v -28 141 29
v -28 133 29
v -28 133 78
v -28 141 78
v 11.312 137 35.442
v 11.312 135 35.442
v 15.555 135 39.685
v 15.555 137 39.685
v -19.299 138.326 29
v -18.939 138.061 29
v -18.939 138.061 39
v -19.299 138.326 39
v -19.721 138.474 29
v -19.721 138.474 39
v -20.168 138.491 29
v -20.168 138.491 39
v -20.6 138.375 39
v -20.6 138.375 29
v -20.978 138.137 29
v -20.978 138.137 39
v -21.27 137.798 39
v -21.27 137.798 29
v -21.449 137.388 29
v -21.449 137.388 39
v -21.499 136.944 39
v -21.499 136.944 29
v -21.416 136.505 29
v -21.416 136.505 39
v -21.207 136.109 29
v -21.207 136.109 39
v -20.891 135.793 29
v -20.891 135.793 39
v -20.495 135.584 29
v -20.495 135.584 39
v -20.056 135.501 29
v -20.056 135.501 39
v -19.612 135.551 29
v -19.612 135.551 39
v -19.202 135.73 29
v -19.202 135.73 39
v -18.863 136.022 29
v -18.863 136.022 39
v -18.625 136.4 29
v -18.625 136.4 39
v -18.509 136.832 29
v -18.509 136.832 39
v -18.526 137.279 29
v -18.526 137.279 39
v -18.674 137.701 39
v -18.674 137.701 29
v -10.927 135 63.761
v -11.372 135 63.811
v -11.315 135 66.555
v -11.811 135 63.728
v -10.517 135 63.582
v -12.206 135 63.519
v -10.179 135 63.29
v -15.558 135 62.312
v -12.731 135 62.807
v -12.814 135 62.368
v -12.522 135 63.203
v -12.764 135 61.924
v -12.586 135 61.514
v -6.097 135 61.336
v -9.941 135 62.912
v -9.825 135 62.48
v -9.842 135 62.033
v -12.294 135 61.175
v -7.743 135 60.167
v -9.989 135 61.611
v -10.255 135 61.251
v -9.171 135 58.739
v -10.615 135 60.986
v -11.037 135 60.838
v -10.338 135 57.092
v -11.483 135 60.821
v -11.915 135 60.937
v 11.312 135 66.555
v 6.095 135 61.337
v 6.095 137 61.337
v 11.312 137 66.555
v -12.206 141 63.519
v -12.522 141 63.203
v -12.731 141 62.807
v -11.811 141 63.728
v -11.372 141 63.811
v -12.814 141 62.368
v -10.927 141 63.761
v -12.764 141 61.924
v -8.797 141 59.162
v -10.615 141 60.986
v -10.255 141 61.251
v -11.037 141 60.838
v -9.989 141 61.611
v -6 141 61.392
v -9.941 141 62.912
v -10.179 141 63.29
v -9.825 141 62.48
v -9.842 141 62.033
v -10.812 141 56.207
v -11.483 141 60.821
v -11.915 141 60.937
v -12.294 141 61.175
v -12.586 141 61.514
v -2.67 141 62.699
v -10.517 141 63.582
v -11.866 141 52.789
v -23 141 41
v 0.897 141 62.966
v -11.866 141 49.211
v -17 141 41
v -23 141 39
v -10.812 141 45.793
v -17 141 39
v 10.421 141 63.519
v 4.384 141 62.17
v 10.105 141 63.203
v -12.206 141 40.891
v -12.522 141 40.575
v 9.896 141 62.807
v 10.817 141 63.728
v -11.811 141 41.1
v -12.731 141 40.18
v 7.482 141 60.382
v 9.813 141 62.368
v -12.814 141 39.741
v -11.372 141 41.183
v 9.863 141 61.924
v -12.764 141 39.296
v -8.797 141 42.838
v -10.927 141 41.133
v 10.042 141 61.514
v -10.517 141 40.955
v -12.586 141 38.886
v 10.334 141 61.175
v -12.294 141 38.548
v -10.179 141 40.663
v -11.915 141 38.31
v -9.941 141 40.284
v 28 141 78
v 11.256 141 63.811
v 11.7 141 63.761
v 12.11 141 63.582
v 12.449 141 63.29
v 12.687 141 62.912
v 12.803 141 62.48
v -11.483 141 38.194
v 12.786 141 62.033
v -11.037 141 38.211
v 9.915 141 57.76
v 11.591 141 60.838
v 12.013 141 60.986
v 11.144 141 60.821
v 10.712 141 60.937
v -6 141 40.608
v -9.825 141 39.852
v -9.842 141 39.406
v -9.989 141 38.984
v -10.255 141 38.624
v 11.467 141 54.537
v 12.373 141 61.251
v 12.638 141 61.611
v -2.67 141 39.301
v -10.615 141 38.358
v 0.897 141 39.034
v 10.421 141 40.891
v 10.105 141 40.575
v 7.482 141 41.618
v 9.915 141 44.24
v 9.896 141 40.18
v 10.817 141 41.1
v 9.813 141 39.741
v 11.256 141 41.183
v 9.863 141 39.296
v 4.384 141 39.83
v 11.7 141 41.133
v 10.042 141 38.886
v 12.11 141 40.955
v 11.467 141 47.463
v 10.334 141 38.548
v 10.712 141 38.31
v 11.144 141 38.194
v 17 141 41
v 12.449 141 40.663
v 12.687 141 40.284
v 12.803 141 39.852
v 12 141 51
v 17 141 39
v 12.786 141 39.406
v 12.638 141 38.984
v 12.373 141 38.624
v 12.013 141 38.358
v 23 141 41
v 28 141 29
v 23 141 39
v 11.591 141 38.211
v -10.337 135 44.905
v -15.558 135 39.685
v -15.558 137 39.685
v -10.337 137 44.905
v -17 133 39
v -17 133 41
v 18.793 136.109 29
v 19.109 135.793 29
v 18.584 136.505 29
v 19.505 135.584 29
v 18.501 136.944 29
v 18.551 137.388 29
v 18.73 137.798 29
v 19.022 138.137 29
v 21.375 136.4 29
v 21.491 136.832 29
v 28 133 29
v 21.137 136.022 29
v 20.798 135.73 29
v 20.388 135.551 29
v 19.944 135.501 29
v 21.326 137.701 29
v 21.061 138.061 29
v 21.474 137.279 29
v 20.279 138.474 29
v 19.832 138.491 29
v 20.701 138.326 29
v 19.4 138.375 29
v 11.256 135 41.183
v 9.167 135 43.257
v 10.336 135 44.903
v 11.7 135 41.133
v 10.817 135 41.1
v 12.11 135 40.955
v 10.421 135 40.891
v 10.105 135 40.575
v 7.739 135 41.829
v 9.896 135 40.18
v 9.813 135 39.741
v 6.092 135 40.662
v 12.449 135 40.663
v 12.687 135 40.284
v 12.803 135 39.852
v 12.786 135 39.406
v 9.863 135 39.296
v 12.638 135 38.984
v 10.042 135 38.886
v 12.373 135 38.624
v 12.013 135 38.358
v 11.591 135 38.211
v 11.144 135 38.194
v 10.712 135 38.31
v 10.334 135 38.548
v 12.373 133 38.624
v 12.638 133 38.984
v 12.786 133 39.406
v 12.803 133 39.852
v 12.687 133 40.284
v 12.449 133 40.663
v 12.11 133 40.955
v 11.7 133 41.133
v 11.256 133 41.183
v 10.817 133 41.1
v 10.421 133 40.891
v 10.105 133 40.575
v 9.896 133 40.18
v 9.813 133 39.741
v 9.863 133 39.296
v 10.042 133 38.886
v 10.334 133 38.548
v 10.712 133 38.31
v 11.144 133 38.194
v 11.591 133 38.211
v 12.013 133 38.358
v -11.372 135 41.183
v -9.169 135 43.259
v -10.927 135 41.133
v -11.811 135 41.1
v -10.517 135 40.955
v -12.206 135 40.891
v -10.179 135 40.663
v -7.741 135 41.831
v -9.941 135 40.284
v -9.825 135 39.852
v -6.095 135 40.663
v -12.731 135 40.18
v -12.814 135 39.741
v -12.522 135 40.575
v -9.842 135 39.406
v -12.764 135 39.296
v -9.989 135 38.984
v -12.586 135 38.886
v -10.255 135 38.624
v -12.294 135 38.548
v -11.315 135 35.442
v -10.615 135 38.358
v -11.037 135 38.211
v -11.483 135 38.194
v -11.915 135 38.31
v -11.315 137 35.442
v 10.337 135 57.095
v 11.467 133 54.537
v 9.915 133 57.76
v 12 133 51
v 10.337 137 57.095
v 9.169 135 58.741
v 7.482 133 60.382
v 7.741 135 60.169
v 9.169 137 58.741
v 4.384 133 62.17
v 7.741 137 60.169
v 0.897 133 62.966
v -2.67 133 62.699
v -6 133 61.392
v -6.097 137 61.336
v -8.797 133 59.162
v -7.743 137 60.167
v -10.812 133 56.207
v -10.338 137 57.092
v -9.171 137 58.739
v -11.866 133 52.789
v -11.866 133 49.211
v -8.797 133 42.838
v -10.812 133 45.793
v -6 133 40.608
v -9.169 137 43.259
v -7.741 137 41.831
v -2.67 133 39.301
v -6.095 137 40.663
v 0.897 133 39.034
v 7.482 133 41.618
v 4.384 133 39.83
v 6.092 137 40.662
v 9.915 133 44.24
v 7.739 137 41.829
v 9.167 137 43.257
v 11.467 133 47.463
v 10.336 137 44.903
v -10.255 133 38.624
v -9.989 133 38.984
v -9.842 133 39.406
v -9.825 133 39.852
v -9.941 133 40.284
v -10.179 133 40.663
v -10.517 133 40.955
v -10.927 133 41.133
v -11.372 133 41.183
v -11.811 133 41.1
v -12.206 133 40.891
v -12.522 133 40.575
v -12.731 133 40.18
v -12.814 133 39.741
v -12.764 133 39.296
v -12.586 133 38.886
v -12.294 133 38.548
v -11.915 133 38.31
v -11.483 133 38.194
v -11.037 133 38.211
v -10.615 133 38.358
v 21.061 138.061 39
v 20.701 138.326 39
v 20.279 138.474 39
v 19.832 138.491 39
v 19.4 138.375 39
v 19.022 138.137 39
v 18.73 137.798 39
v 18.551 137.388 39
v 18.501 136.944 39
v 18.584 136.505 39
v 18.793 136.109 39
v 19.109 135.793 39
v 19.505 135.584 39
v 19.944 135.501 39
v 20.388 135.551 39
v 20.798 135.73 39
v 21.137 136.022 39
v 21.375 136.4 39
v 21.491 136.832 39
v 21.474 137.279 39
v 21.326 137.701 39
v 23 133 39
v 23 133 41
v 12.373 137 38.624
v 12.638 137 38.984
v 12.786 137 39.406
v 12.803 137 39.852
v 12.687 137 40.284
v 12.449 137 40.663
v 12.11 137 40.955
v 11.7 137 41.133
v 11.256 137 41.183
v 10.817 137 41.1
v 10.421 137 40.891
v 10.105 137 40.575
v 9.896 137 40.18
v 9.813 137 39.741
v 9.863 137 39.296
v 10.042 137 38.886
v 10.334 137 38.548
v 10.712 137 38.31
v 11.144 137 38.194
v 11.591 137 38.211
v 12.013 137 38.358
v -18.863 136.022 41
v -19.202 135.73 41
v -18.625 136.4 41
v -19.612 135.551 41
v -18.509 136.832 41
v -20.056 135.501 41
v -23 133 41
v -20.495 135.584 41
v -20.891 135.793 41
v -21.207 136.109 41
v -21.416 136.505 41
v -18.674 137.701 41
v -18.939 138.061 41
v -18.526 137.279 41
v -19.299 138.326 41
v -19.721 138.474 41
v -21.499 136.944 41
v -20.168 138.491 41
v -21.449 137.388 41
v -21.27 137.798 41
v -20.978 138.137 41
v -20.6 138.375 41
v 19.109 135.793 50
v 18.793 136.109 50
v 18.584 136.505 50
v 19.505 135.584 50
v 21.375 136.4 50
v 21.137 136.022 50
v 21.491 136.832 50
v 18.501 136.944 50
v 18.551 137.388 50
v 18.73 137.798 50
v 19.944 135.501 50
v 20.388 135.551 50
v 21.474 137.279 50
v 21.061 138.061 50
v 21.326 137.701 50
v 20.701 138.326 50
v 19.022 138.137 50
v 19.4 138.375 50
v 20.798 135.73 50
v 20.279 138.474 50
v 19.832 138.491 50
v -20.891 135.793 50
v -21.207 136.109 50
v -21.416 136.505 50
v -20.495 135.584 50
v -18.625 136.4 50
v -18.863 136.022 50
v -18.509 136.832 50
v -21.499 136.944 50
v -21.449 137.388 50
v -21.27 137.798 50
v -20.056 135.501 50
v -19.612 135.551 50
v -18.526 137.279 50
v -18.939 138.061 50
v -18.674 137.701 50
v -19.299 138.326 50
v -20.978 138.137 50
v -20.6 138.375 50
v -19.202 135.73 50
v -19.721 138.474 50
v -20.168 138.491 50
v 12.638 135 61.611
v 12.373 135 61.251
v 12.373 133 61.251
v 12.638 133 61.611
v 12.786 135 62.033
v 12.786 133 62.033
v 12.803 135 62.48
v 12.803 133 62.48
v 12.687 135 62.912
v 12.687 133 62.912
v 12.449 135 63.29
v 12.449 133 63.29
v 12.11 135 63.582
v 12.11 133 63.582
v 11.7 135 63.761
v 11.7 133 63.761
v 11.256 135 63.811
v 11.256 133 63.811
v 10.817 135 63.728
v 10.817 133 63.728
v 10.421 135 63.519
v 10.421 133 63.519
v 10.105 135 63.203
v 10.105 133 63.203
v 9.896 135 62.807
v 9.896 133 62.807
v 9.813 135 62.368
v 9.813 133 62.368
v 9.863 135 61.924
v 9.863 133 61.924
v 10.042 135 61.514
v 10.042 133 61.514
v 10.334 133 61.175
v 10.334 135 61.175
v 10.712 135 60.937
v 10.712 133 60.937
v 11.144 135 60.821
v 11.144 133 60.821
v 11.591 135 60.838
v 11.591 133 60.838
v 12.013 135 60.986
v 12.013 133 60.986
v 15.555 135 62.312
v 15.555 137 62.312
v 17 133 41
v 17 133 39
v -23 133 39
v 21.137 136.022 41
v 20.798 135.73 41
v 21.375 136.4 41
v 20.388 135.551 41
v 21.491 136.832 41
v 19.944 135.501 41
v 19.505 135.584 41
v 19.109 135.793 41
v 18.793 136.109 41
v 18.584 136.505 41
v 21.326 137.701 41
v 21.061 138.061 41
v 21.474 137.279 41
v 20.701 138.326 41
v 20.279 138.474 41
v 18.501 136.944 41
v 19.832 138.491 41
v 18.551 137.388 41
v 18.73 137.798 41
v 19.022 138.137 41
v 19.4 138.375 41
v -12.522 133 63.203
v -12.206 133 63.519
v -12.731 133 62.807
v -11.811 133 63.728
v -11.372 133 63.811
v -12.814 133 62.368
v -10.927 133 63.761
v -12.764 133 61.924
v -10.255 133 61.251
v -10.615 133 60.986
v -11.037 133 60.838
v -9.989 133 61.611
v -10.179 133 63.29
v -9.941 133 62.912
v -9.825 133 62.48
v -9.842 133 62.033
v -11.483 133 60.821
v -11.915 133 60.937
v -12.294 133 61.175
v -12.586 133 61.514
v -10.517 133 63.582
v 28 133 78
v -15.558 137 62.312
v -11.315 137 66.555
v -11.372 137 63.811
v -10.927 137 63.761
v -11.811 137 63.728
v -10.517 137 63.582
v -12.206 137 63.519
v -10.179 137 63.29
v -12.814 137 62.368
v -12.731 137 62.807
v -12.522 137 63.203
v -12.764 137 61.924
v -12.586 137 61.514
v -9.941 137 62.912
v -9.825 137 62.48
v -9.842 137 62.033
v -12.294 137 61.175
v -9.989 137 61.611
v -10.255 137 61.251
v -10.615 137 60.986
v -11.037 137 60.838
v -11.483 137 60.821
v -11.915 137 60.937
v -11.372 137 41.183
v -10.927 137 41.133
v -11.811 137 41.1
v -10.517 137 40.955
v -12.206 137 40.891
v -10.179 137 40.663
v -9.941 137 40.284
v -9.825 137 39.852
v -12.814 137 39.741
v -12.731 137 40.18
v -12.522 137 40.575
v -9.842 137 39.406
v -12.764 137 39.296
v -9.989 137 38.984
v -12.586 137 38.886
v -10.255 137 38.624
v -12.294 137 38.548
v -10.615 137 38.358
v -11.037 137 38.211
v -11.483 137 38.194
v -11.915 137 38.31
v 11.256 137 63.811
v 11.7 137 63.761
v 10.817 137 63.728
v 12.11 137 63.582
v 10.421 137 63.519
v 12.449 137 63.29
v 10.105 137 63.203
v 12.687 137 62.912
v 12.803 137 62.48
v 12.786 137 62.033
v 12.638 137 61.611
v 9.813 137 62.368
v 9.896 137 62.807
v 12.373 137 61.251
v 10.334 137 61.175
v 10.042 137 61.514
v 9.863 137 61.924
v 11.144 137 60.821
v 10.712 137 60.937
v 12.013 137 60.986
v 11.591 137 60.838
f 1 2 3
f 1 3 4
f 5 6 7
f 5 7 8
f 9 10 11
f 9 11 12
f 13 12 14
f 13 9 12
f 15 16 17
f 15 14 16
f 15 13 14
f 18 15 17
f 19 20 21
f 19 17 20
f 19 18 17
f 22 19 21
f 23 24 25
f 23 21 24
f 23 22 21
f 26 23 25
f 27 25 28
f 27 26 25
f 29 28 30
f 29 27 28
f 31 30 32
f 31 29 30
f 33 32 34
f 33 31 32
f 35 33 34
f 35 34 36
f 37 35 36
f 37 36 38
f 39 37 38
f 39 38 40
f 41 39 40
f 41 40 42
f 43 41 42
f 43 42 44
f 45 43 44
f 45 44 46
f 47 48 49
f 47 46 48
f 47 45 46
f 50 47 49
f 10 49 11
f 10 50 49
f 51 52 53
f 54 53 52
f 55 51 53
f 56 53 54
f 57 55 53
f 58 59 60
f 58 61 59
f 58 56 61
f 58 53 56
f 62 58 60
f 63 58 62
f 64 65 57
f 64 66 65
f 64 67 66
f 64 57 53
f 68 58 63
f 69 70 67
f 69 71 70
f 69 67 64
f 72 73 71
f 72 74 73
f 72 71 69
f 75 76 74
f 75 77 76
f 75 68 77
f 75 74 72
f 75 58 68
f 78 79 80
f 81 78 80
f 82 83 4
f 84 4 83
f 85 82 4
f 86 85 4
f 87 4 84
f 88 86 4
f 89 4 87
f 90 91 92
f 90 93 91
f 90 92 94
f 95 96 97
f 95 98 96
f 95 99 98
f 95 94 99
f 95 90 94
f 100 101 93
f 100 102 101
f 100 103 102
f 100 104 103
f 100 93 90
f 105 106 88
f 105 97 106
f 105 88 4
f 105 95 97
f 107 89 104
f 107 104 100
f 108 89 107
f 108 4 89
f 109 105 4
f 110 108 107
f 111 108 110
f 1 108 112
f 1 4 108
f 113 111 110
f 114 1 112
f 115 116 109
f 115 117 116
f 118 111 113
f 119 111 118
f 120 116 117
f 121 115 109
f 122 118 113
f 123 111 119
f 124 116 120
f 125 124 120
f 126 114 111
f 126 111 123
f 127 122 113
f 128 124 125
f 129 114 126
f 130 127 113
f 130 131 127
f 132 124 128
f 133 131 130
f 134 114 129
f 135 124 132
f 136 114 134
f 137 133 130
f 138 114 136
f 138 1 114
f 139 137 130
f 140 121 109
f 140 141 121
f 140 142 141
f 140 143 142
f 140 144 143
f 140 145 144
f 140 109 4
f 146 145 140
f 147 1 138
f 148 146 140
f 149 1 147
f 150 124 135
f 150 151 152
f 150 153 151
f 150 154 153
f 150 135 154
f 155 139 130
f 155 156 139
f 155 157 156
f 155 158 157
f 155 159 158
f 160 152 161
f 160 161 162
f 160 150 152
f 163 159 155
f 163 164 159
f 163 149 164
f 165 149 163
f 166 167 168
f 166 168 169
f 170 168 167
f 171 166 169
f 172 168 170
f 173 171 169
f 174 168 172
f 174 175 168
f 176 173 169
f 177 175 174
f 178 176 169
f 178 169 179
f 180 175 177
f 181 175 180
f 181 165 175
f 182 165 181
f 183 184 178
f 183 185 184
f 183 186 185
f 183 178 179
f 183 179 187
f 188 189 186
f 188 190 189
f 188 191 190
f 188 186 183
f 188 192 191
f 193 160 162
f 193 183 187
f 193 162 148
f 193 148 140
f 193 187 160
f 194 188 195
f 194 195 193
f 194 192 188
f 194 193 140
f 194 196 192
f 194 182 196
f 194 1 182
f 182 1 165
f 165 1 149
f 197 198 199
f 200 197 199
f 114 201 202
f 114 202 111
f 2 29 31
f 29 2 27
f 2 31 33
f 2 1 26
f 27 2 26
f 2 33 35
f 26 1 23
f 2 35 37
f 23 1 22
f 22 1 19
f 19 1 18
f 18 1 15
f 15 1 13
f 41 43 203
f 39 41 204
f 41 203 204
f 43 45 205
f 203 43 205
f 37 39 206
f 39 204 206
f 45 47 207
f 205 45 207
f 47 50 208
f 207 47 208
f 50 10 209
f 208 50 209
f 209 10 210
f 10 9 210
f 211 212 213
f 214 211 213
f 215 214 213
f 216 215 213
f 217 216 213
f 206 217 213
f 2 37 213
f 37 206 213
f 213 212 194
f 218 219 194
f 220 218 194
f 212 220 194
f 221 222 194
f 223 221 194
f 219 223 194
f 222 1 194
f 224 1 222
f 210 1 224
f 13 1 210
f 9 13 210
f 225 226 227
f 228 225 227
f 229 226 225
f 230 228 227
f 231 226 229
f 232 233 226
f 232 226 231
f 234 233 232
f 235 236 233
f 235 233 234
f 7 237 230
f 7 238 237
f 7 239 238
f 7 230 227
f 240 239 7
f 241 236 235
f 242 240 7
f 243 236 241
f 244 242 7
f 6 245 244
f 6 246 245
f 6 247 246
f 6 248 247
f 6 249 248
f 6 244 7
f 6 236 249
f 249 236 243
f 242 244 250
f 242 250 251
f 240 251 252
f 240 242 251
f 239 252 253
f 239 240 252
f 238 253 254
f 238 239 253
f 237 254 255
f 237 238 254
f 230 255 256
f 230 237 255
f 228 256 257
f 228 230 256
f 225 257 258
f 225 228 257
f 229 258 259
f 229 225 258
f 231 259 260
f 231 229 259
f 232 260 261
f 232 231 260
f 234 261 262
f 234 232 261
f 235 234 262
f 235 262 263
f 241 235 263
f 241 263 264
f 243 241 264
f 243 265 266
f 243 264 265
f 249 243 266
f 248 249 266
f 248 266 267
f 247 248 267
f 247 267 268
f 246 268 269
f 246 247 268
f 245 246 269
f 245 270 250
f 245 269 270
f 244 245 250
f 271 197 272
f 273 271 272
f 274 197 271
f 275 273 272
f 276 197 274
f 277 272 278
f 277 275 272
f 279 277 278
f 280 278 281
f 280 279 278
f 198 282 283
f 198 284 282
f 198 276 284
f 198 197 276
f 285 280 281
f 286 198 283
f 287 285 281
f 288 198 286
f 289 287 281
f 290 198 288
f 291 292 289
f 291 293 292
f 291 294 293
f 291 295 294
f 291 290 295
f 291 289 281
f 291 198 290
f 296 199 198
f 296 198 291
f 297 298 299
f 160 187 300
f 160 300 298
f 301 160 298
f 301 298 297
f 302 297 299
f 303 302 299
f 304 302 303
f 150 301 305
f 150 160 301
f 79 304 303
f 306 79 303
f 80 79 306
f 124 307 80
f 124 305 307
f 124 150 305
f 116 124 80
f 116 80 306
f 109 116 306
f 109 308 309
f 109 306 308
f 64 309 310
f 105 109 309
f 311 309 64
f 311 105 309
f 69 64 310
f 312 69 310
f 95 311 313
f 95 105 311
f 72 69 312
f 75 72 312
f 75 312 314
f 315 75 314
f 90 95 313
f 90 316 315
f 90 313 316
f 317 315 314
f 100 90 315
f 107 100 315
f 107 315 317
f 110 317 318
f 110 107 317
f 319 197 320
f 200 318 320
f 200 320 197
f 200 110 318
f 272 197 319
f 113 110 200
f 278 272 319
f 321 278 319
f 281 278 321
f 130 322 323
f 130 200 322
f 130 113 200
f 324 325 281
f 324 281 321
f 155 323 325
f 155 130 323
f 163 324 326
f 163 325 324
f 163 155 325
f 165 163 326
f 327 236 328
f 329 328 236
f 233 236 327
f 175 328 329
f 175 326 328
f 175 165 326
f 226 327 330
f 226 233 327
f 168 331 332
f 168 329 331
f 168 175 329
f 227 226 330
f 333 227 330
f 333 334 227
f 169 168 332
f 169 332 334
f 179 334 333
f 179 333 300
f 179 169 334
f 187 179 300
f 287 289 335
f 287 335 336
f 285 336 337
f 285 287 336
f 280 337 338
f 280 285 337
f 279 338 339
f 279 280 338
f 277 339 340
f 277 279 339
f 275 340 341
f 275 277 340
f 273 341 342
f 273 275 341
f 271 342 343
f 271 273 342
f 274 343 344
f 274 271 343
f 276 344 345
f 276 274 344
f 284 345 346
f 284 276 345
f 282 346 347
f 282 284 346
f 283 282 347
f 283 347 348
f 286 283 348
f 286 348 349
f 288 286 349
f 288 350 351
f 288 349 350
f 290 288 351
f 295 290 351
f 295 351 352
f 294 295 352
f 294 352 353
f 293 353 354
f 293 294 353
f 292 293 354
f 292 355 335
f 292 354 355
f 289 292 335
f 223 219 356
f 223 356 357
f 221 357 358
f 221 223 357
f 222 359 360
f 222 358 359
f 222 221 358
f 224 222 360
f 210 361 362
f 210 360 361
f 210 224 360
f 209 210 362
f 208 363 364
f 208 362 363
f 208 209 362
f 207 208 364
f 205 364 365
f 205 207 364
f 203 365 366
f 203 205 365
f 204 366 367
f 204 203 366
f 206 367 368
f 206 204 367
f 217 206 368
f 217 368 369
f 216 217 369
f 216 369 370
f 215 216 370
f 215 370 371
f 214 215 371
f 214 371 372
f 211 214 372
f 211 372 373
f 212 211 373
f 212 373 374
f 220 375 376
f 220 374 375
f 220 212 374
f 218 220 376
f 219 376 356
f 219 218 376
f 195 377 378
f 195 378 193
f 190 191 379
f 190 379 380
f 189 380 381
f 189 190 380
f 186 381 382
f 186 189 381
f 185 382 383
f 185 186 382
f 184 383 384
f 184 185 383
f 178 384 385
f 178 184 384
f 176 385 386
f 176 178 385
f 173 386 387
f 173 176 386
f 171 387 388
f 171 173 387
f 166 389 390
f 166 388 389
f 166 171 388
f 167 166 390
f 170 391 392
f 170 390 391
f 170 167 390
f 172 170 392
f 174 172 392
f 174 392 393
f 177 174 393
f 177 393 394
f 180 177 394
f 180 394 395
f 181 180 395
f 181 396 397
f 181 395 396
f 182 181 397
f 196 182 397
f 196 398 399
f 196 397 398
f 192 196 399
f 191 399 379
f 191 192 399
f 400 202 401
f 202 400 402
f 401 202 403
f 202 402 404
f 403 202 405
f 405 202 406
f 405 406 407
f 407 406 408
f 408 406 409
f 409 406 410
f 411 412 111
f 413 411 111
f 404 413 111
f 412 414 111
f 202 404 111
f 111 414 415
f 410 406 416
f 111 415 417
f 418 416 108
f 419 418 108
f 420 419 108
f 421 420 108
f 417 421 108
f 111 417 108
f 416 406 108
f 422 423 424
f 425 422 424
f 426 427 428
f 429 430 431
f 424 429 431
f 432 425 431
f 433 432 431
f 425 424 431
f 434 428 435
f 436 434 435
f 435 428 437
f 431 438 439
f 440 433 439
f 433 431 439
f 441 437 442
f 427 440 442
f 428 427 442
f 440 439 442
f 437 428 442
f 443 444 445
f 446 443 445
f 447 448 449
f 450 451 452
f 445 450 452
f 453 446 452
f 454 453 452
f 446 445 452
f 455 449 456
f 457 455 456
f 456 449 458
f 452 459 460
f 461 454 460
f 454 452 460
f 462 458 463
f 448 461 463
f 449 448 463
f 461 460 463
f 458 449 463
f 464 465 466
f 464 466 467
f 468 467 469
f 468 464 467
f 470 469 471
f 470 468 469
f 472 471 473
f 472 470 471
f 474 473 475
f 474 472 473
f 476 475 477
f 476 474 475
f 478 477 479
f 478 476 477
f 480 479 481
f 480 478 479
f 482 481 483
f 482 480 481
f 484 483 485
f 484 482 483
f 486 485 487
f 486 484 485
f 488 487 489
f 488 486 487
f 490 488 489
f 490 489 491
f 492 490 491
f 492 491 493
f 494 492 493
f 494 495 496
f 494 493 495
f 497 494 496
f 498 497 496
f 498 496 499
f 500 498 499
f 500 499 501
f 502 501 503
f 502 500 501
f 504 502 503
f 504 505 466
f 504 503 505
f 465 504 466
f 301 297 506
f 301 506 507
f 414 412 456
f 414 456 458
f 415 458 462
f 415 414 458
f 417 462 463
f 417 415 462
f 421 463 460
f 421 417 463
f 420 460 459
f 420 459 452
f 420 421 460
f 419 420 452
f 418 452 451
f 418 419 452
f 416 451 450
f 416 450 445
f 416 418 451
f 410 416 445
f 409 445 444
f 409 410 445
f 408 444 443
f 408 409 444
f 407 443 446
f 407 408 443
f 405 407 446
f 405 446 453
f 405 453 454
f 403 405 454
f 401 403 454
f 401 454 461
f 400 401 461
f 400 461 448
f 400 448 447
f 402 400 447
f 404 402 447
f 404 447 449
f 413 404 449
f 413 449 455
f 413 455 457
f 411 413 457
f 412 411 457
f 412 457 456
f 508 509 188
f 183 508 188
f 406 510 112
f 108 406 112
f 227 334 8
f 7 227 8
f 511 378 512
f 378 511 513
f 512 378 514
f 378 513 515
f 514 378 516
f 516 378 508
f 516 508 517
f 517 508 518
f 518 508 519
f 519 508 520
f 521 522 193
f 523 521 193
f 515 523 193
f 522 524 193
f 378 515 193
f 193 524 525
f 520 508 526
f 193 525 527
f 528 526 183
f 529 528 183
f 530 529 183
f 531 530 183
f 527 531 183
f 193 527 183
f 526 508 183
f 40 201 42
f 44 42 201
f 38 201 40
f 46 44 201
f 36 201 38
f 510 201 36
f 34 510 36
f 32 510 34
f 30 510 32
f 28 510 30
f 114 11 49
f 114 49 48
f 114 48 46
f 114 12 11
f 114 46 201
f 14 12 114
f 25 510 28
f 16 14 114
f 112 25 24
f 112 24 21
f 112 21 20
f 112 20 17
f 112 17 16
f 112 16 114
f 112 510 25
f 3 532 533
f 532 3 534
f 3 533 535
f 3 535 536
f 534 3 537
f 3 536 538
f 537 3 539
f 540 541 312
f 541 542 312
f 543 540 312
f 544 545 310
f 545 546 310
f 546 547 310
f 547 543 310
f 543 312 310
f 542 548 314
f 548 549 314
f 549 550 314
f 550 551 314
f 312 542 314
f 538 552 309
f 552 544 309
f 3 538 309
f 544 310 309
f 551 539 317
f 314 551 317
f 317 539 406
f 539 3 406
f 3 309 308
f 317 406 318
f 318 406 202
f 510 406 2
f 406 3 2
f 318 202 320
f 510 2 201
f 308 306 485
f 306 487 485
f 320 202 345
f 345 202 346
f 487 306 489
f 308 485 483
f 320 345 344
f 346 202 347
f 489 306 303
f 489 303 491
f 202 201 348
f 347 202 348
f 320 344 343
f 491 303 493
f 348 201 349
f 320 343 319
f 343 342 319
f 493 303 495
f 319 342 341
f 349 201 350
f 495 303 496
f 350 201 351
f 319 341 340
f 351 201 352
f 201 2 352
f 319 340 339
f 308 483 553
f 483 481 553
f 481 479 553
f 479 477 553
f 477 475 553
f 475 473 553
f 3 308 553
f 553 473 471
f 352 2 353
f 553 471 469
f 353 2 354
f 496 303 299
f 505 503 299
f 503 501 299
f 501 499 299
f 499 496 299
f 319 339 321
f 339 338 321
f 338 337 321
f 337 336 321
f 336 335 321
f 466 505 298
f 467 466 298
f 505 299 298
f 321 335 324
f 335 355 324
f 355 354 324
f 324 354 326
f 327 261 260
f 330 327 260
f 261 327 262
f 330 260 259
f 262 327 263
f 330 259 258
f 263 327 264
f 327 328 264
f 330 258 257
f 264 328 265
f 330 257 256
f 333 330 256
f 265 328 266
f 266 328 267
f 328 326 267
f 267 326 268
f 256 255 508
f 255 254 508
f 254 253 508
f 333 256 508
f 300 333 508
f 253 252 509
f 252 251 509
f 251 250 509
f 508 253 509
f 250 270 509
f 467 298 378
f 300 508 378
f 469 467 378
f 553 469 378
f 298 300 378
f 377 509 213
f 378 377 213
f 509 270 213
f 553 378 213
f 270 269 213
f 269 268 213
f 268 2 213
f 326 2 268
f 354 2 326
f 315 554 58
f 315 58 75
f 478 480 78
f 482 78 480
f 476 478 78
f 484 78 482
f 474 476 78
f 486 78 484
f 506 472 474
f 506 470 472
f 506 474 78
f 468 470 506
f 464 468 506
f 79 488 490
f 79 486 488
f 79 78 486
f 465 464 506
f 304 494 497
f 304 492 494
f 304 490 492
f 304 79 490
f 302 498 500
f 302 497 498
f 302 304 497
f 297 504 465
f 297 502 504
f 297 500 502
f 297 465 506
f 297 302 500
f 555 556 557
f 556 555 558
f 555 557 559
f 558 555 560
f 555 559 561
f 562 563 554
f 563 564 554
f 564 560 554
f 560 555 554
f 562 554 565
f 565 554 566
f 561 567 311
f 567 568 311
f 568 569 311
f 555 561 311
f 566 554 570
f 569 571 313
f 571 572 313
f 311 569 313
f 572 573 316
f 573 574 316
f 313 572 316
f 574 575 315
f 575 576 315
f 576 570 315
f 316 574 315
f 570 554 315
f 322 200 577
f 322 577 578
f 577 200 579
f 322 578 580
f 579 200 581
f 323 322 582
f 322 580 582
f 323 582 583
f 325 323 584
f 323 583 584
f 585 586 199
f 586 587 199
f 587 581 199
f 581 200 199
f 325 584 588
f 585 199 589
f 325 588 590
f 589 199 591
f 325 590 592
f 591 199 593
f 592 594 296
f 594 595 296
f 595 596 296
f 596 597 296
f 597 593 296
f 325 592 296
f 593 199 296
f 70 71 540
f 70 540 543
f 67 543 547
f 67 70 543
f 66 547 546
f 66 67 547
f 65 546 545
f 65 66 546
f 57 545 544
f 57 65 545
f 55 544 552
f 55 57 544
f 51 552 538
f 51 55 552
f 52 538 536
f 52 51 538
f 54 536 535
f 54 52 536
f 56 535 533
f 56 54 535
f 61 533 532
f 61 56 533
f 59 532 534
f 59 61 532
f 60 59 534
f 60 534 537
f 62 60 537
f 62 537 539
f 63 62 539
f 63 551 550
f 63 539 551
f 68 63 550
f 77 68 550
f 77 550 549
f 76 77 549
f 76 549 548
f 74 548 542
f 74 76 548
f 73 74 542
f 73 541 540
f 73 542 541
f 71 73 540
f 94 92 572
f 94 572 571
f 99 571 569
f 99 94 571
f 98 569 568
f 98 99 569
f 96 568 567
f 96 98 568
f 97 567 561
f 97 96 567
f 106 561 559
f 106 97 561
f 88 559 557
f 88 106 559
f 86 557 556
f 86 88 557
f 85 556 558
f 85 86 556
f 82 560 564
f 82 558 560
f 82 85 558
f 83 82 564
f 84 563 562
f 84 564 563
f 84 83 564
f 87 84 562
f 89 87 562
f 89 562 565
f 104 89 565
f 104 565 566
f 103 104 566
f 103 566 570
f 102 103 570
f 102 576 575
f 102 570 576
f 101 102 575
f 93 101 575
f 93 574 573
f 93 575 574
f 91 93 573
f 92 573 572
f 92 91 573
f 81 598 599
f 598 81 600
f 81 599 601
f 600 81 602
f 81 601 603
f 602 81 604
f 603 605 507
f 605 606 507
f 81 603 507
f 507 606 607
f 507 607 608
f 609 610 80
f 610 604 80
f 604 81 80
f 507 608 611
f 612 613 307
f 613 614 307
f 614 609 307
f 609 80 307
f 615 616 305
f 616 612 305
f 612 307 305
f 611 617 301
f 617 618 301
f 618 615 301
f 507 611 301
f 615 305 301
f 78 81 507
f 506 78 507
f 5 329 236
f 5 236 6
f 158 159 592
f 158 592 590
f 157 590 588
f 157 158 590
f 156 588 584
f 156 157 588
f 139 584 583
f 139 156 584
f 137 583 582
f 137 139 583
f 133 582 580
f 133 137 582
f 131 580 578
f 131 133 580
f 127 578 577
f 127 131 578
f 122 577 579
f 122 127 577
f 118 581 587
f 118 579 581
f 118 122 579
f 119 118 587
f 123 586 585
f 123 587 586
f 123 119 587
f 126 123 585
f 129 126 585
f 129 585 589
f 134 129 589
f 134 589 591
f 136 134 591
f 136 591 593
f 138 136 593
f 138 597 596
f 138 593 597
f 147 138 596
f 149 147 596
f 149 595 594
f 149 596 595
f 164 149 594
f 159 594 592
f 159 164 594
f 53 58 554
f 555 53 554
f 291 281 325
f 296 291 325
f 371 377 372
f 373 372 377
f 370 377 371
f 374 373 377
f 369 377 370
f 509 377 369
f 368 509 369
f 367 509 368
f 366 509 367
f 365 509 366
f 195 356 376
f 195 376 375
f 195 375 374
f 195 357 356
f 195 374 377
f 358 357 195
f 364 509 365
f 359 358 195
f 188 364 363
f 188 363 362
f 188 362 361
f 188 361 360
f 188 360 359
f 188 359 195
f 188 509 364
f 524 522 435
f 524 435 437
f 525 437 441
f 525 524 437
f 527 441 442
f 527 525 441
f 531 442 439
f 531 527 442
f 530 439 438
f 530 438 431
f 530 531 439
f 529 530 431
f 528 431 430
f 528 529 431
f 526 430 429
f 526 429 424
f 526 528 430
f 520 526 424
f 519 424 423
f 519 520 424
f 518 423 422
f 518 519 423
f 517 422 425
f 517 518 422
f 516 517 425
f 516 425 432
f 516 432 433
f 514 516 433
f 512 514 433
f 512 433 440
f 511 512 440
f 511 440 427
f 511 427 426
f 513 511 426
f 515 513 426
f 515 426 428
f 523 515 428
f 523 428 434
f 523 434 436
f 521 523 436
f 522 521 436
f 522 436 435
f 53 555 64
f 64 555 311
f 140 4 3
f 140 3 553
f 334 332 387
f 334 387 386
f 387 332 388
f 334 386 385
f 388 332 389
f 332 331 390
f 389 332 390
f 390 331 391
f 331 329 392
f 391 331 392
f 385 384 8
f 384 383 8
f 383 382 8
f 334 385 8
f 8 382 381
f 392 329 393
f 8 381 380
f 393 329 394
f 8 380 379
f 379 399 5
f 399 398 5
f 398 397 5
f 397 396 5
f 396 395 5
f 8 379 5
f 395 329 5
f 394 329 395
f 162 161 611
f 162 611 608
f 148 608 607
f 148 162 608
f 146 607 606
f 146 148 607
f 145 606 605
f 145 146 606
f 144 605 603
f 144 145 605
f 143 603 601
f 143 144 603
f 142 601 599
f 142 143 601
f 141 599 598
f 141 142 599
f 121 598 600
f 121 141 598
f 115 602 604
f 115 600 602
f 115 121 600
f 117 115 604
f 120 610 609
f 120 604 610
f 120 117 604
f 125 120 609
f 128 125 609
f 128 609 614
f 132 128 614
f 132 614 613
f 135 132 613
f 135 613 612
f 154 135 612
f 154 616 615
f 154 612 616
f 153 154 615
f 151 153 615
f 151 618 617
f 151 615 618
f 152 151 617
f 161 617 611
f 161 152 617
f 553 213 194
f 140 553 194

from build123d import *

# Parameters (mm, degrees)
BOX775_W                     = 8
BOX775_H                     = 6
BOX775_DEPTH                 = 2
BOX776_W                     = 8
BOX776_H                     = 6
BOX776_DEPTH                 = 2
CYLINDER1869_R               = 1.5
CYLINDER1869_DEPTH           = 50
CYLINDER1869_PLACEMENT_ANGLE = 45
CYLINDER1870_R               = 1.5
CYLINDER1870_DEPTH           = 50
CYLINDER1870_PLACEMENT_ANGLE = 45
BOX770_W                     = 6
BOX770_H                     = 2
BOX770_DEPTH                 = 8
BOX766_W                     = 8
BOX766_H                     = 2
BOX766_DEPTH                 = 6
BOX768_W                     = 8
BOX768_H                     = 2
BOX768_DEPTH                 = 6
BOX769_W                     = 6
BOX769_H                     = 2
BOX769_DEPTH                 = 8
COMPOUND924_PLACEMENT_ANGLE  = 45
CYLINDER1846_R               = 12
CYLINDER1846_DEPTH           = 20
CYLINDER1848_R               = 1.5
CYLINDER1848_DEPTH           = 40
CYLINDER1850_R               = 1.5
CYLINDER1850_DEPTH           = 40
CYLINDER1849_R               = 1.5
CYLINDER1849_DEPTH           = 40
CYLINDER1847_R               = 1.5
CYLINDER1847_DEPTH           = 40
COMPOUND925_PLACEMENT_ANGLE  = 45
BOX767_W                     = 56
BOX767_H                     = 8
BOX767_DEPTH                 = 49


with BuildPart() as krychle775:
    # Box775 → Box775 (new body)
    with BuildSketch(Plane(origin=(-17, 114, 39), x_dir=(0, 1, 0), z_dir=(0, 0, 1))):
        with Locations((4, 3)):
            Rectangle(BOX775_W, BOX775_H)
    extrude(amount=BOX775_DEPTH)


with BuildPart() as compound934:
    # Box776 → Box776 (new body)
    with BuildSketch(Plane(origin=(23, 114, 39), x_dir=(0, 1, 0), z_dir=(0, 0, 1))):
        with Locations((4, 3)):
            Rectangle(BOX776_W, BOX776_H)
    extrude(amount=BOX776_DEPTH)

    # Compound934: union Krychle775
    add(krychle775.part)


with BuildPart() as compound934_1:
    # Compound934 placement: moved
    add(compound934.part.moved(Location((0, 18, 0))))


with BuildPart() as v_lec1869:
    # Cylinder1869 → Cylinder1869 (new body)
    with BuildSketch(Plane.XY):
        Circle(CYLINDER1869_R)
    extrude(amount=CYLINDER1869_DEPTH)


with BuildPart() as v_lec1869_1:
    # Cylinder1869 placement: moved
    add(v_lec1869.part.moved(Location((20, 118, 0))).rotate(Axis((20, 118, 0), (0, 0, 1)), CYLINDER1869_PLACEMENT_ANGLE))


with BuildPart() as compound935:
    # Cylinder1870 → Cylinder1870 (new body)
    with BuildSketch(Plane.XY):
        Circle(CYLINDER1870_R)
    extrude(amount=CYLINDER1870_DEPTH)


with BuildPart() as compound935_1:
    # Cylinder1870 placement: moved
    add(compound935.part.moved(Location((-20, 118, 0))).rotate(Axis((-20, 118, 0), (0, 0, 1)), CYLINDER1870_PLACEMENT_ANGLE))

    # Compound935: union Válec1869
    add(v_lec1869_1.part)


with BuildPart() as compound935_2:
    # Compound935 placement: moved
    add(compound935_1.part.moved(Location((0, 18, 0))))


with BuildPart() as krychle770:
    # Box770 → Box770 (new body)
    with BuildSketch(Plane(origin=(-3, 116, 30), x_dir=(1, 0, 0), z_dir=(0, 0, 1))):
        with Locations((3, 1)):
            Rectangle(BOX770_W, BOX770_H)
    extrude(amount=BOX770_DEPTH)


with BuildPart() as krychle766:
    # Box766 → Box766 (new body)
    with BuildSketch(Plane(origin=(-19, 116, 46), x_dir=(1, 0, 0), z_dir=(0, 0, 1))):
        with Locations((4, 1)):
            Rectangle(BOX766_W, BOX766_H)
    extrude(amount=BOX766_DEPTH)


with BuildPart() as krychle768:
    # Box768 → Box768 (new body)
    with BuildSketch(Plane(origin=(11, 116, 46), x_dir=(1, 0, 0), z_dir=(0, 0, 1))):
        with Locations((4, 1)):
            Rectangle(BOX768_W, BOX768_H)
    extrude(amount=BOX768_DEPTH)


with BuildPart() as compound924:
    # Box769 → Box769 (new body)
    with BuildSketch(Plane(origin=(-3, 116, 60), x_dir=(1, 0, 0), z_dir=(0, 0, 1))):
        with Locations((3, 1)):
            Rectangle(BOX769_W, BOX769_H)
    extrude(amount=BOX769_DEPTH)

    # Compound924: union Krychle770, Krychle766, Krychle768
    add(krychle770.part)
    add(krychle766.part)
    add(krychle768.part)


with BuildPart() as compound924_1:
    # Compound924 placement: moved
    add(compound924.part.moved(Location((-34.65, 0, 16.35))).rotate(Axis((-34.65, 0, 16.35), (0, 1, 0)), COMPOUND924_PLACEMENT_ANGLE))


with BuildPart() as v_lec1846:
    # Cylinder1846 → Cylinder1846 (new body)
    with BuildSketch(Plane(origin=(0, 124, 51), x_dir=(1, 0, 0), z_dir=(0, -1, 0))):
        Circle(CYLINDER1846_R)
    extrude(amount=CYLINDER1846_DEPTH)


with BuildPart() as v_lec1848:
    # Cylinder1848 → Cylinder1848 (new body)
    with BuildSketch(Plane(origin=(16, 140, 49), x_dir=(1, 0, 0), z_dir=(0, -1, 0))):
        Circle(CYLINDER1848_R)
    extrude(amount=CYLINDER1848_DEPTH)


with BuildPart() as v_lec1850:
    # Cylinder1850 → Cylinder1850 (new body)
    with BuildSketch(Plane(origin=(-16, 140, 49), x_dir=(1, 0, 0), z_dir=(0, -1, 0))):
        Circle(CYLINDER1850_R)
    extrude(amount=CYLINDER1850_DEPTH)


with BuildPart() as v_lec1849:
    # Cylinder1849 → Cylinder1849 (new body)
    with BuildSketch(Plane(origin=(0, 140, 33), x_dir=(1, 0, 0), z_dir=(0, -1, 0))):
        Circle(CYLINDER1849_R)
    extrude(amount=CYLINDER1849_DEPTH)


with BuildPart() as compound925:
    # Cylinder1847 → Cylinder1847 (new body)
    with BuildSketch(Plane(origin=(0, 140, 65), x_dir=(1, 0, 0), z_dir=(0, -1, 0))):
        Circle(CYLINDER1847_R)
    extrude(amount=CYLINDER1847_DEPTH)

    # Compound925: union Válec1848, Válec1850, Válec1849
    add(v_lec1848.part)
    add(v_lec1850.part)
    add(v_lec1849.part)


with BuildPart() as compound925_1:
    # Compound925 placement: moved
    add(compound925.part.moved(Location((-34.65, 0, 16.35))).rotate(Axis((-34.65, 0, 16.35), (0, 1, 0)), COMPOUND925_PLACEMENT_ANGLE))


with BuildPart() as cut583:
    # Box767 → Box767 (new body)
    with BuildSketch(Plane(origin=(-28, 114, 29), x_dir=(1, 0, 0), z_dir=(0, 0, 1))):
        with Locations((28, 4)):
            Rectangle(BOX767_W, BOX767_H)
    extrude(amount=BOX767_DEPTH)

    # Cut571: cut Compound925
    add(compound925_1.part, mode=Mode.SUBTRACT)

    # Cut573: cut Válec1846
    add(v_lec1846.part, mode=Mode.SUBTRACT)

    # Cut572: cut Compound924
    add(compound924_1.part, mode=Mode.SUBTRACT)


with BuildPart() as cut583_1:
    # Cut572 placement: moved
    add(cut583.part.moved(Location((0, 18, 0))))

    # Cut582: cut Compound935
    add(compound935_2.part, mode=Mode.SUBTRACT)

    # Cut583: cut Compound934
    add(compound934_1.part, mode=Mode.SUBTRACT)


with BuildPart() as cut583_2:
    # Cut583 placement: moved
    add(cut583_1.part.moved(Location((0, 1, 0))))


solid = cut583_2.part
